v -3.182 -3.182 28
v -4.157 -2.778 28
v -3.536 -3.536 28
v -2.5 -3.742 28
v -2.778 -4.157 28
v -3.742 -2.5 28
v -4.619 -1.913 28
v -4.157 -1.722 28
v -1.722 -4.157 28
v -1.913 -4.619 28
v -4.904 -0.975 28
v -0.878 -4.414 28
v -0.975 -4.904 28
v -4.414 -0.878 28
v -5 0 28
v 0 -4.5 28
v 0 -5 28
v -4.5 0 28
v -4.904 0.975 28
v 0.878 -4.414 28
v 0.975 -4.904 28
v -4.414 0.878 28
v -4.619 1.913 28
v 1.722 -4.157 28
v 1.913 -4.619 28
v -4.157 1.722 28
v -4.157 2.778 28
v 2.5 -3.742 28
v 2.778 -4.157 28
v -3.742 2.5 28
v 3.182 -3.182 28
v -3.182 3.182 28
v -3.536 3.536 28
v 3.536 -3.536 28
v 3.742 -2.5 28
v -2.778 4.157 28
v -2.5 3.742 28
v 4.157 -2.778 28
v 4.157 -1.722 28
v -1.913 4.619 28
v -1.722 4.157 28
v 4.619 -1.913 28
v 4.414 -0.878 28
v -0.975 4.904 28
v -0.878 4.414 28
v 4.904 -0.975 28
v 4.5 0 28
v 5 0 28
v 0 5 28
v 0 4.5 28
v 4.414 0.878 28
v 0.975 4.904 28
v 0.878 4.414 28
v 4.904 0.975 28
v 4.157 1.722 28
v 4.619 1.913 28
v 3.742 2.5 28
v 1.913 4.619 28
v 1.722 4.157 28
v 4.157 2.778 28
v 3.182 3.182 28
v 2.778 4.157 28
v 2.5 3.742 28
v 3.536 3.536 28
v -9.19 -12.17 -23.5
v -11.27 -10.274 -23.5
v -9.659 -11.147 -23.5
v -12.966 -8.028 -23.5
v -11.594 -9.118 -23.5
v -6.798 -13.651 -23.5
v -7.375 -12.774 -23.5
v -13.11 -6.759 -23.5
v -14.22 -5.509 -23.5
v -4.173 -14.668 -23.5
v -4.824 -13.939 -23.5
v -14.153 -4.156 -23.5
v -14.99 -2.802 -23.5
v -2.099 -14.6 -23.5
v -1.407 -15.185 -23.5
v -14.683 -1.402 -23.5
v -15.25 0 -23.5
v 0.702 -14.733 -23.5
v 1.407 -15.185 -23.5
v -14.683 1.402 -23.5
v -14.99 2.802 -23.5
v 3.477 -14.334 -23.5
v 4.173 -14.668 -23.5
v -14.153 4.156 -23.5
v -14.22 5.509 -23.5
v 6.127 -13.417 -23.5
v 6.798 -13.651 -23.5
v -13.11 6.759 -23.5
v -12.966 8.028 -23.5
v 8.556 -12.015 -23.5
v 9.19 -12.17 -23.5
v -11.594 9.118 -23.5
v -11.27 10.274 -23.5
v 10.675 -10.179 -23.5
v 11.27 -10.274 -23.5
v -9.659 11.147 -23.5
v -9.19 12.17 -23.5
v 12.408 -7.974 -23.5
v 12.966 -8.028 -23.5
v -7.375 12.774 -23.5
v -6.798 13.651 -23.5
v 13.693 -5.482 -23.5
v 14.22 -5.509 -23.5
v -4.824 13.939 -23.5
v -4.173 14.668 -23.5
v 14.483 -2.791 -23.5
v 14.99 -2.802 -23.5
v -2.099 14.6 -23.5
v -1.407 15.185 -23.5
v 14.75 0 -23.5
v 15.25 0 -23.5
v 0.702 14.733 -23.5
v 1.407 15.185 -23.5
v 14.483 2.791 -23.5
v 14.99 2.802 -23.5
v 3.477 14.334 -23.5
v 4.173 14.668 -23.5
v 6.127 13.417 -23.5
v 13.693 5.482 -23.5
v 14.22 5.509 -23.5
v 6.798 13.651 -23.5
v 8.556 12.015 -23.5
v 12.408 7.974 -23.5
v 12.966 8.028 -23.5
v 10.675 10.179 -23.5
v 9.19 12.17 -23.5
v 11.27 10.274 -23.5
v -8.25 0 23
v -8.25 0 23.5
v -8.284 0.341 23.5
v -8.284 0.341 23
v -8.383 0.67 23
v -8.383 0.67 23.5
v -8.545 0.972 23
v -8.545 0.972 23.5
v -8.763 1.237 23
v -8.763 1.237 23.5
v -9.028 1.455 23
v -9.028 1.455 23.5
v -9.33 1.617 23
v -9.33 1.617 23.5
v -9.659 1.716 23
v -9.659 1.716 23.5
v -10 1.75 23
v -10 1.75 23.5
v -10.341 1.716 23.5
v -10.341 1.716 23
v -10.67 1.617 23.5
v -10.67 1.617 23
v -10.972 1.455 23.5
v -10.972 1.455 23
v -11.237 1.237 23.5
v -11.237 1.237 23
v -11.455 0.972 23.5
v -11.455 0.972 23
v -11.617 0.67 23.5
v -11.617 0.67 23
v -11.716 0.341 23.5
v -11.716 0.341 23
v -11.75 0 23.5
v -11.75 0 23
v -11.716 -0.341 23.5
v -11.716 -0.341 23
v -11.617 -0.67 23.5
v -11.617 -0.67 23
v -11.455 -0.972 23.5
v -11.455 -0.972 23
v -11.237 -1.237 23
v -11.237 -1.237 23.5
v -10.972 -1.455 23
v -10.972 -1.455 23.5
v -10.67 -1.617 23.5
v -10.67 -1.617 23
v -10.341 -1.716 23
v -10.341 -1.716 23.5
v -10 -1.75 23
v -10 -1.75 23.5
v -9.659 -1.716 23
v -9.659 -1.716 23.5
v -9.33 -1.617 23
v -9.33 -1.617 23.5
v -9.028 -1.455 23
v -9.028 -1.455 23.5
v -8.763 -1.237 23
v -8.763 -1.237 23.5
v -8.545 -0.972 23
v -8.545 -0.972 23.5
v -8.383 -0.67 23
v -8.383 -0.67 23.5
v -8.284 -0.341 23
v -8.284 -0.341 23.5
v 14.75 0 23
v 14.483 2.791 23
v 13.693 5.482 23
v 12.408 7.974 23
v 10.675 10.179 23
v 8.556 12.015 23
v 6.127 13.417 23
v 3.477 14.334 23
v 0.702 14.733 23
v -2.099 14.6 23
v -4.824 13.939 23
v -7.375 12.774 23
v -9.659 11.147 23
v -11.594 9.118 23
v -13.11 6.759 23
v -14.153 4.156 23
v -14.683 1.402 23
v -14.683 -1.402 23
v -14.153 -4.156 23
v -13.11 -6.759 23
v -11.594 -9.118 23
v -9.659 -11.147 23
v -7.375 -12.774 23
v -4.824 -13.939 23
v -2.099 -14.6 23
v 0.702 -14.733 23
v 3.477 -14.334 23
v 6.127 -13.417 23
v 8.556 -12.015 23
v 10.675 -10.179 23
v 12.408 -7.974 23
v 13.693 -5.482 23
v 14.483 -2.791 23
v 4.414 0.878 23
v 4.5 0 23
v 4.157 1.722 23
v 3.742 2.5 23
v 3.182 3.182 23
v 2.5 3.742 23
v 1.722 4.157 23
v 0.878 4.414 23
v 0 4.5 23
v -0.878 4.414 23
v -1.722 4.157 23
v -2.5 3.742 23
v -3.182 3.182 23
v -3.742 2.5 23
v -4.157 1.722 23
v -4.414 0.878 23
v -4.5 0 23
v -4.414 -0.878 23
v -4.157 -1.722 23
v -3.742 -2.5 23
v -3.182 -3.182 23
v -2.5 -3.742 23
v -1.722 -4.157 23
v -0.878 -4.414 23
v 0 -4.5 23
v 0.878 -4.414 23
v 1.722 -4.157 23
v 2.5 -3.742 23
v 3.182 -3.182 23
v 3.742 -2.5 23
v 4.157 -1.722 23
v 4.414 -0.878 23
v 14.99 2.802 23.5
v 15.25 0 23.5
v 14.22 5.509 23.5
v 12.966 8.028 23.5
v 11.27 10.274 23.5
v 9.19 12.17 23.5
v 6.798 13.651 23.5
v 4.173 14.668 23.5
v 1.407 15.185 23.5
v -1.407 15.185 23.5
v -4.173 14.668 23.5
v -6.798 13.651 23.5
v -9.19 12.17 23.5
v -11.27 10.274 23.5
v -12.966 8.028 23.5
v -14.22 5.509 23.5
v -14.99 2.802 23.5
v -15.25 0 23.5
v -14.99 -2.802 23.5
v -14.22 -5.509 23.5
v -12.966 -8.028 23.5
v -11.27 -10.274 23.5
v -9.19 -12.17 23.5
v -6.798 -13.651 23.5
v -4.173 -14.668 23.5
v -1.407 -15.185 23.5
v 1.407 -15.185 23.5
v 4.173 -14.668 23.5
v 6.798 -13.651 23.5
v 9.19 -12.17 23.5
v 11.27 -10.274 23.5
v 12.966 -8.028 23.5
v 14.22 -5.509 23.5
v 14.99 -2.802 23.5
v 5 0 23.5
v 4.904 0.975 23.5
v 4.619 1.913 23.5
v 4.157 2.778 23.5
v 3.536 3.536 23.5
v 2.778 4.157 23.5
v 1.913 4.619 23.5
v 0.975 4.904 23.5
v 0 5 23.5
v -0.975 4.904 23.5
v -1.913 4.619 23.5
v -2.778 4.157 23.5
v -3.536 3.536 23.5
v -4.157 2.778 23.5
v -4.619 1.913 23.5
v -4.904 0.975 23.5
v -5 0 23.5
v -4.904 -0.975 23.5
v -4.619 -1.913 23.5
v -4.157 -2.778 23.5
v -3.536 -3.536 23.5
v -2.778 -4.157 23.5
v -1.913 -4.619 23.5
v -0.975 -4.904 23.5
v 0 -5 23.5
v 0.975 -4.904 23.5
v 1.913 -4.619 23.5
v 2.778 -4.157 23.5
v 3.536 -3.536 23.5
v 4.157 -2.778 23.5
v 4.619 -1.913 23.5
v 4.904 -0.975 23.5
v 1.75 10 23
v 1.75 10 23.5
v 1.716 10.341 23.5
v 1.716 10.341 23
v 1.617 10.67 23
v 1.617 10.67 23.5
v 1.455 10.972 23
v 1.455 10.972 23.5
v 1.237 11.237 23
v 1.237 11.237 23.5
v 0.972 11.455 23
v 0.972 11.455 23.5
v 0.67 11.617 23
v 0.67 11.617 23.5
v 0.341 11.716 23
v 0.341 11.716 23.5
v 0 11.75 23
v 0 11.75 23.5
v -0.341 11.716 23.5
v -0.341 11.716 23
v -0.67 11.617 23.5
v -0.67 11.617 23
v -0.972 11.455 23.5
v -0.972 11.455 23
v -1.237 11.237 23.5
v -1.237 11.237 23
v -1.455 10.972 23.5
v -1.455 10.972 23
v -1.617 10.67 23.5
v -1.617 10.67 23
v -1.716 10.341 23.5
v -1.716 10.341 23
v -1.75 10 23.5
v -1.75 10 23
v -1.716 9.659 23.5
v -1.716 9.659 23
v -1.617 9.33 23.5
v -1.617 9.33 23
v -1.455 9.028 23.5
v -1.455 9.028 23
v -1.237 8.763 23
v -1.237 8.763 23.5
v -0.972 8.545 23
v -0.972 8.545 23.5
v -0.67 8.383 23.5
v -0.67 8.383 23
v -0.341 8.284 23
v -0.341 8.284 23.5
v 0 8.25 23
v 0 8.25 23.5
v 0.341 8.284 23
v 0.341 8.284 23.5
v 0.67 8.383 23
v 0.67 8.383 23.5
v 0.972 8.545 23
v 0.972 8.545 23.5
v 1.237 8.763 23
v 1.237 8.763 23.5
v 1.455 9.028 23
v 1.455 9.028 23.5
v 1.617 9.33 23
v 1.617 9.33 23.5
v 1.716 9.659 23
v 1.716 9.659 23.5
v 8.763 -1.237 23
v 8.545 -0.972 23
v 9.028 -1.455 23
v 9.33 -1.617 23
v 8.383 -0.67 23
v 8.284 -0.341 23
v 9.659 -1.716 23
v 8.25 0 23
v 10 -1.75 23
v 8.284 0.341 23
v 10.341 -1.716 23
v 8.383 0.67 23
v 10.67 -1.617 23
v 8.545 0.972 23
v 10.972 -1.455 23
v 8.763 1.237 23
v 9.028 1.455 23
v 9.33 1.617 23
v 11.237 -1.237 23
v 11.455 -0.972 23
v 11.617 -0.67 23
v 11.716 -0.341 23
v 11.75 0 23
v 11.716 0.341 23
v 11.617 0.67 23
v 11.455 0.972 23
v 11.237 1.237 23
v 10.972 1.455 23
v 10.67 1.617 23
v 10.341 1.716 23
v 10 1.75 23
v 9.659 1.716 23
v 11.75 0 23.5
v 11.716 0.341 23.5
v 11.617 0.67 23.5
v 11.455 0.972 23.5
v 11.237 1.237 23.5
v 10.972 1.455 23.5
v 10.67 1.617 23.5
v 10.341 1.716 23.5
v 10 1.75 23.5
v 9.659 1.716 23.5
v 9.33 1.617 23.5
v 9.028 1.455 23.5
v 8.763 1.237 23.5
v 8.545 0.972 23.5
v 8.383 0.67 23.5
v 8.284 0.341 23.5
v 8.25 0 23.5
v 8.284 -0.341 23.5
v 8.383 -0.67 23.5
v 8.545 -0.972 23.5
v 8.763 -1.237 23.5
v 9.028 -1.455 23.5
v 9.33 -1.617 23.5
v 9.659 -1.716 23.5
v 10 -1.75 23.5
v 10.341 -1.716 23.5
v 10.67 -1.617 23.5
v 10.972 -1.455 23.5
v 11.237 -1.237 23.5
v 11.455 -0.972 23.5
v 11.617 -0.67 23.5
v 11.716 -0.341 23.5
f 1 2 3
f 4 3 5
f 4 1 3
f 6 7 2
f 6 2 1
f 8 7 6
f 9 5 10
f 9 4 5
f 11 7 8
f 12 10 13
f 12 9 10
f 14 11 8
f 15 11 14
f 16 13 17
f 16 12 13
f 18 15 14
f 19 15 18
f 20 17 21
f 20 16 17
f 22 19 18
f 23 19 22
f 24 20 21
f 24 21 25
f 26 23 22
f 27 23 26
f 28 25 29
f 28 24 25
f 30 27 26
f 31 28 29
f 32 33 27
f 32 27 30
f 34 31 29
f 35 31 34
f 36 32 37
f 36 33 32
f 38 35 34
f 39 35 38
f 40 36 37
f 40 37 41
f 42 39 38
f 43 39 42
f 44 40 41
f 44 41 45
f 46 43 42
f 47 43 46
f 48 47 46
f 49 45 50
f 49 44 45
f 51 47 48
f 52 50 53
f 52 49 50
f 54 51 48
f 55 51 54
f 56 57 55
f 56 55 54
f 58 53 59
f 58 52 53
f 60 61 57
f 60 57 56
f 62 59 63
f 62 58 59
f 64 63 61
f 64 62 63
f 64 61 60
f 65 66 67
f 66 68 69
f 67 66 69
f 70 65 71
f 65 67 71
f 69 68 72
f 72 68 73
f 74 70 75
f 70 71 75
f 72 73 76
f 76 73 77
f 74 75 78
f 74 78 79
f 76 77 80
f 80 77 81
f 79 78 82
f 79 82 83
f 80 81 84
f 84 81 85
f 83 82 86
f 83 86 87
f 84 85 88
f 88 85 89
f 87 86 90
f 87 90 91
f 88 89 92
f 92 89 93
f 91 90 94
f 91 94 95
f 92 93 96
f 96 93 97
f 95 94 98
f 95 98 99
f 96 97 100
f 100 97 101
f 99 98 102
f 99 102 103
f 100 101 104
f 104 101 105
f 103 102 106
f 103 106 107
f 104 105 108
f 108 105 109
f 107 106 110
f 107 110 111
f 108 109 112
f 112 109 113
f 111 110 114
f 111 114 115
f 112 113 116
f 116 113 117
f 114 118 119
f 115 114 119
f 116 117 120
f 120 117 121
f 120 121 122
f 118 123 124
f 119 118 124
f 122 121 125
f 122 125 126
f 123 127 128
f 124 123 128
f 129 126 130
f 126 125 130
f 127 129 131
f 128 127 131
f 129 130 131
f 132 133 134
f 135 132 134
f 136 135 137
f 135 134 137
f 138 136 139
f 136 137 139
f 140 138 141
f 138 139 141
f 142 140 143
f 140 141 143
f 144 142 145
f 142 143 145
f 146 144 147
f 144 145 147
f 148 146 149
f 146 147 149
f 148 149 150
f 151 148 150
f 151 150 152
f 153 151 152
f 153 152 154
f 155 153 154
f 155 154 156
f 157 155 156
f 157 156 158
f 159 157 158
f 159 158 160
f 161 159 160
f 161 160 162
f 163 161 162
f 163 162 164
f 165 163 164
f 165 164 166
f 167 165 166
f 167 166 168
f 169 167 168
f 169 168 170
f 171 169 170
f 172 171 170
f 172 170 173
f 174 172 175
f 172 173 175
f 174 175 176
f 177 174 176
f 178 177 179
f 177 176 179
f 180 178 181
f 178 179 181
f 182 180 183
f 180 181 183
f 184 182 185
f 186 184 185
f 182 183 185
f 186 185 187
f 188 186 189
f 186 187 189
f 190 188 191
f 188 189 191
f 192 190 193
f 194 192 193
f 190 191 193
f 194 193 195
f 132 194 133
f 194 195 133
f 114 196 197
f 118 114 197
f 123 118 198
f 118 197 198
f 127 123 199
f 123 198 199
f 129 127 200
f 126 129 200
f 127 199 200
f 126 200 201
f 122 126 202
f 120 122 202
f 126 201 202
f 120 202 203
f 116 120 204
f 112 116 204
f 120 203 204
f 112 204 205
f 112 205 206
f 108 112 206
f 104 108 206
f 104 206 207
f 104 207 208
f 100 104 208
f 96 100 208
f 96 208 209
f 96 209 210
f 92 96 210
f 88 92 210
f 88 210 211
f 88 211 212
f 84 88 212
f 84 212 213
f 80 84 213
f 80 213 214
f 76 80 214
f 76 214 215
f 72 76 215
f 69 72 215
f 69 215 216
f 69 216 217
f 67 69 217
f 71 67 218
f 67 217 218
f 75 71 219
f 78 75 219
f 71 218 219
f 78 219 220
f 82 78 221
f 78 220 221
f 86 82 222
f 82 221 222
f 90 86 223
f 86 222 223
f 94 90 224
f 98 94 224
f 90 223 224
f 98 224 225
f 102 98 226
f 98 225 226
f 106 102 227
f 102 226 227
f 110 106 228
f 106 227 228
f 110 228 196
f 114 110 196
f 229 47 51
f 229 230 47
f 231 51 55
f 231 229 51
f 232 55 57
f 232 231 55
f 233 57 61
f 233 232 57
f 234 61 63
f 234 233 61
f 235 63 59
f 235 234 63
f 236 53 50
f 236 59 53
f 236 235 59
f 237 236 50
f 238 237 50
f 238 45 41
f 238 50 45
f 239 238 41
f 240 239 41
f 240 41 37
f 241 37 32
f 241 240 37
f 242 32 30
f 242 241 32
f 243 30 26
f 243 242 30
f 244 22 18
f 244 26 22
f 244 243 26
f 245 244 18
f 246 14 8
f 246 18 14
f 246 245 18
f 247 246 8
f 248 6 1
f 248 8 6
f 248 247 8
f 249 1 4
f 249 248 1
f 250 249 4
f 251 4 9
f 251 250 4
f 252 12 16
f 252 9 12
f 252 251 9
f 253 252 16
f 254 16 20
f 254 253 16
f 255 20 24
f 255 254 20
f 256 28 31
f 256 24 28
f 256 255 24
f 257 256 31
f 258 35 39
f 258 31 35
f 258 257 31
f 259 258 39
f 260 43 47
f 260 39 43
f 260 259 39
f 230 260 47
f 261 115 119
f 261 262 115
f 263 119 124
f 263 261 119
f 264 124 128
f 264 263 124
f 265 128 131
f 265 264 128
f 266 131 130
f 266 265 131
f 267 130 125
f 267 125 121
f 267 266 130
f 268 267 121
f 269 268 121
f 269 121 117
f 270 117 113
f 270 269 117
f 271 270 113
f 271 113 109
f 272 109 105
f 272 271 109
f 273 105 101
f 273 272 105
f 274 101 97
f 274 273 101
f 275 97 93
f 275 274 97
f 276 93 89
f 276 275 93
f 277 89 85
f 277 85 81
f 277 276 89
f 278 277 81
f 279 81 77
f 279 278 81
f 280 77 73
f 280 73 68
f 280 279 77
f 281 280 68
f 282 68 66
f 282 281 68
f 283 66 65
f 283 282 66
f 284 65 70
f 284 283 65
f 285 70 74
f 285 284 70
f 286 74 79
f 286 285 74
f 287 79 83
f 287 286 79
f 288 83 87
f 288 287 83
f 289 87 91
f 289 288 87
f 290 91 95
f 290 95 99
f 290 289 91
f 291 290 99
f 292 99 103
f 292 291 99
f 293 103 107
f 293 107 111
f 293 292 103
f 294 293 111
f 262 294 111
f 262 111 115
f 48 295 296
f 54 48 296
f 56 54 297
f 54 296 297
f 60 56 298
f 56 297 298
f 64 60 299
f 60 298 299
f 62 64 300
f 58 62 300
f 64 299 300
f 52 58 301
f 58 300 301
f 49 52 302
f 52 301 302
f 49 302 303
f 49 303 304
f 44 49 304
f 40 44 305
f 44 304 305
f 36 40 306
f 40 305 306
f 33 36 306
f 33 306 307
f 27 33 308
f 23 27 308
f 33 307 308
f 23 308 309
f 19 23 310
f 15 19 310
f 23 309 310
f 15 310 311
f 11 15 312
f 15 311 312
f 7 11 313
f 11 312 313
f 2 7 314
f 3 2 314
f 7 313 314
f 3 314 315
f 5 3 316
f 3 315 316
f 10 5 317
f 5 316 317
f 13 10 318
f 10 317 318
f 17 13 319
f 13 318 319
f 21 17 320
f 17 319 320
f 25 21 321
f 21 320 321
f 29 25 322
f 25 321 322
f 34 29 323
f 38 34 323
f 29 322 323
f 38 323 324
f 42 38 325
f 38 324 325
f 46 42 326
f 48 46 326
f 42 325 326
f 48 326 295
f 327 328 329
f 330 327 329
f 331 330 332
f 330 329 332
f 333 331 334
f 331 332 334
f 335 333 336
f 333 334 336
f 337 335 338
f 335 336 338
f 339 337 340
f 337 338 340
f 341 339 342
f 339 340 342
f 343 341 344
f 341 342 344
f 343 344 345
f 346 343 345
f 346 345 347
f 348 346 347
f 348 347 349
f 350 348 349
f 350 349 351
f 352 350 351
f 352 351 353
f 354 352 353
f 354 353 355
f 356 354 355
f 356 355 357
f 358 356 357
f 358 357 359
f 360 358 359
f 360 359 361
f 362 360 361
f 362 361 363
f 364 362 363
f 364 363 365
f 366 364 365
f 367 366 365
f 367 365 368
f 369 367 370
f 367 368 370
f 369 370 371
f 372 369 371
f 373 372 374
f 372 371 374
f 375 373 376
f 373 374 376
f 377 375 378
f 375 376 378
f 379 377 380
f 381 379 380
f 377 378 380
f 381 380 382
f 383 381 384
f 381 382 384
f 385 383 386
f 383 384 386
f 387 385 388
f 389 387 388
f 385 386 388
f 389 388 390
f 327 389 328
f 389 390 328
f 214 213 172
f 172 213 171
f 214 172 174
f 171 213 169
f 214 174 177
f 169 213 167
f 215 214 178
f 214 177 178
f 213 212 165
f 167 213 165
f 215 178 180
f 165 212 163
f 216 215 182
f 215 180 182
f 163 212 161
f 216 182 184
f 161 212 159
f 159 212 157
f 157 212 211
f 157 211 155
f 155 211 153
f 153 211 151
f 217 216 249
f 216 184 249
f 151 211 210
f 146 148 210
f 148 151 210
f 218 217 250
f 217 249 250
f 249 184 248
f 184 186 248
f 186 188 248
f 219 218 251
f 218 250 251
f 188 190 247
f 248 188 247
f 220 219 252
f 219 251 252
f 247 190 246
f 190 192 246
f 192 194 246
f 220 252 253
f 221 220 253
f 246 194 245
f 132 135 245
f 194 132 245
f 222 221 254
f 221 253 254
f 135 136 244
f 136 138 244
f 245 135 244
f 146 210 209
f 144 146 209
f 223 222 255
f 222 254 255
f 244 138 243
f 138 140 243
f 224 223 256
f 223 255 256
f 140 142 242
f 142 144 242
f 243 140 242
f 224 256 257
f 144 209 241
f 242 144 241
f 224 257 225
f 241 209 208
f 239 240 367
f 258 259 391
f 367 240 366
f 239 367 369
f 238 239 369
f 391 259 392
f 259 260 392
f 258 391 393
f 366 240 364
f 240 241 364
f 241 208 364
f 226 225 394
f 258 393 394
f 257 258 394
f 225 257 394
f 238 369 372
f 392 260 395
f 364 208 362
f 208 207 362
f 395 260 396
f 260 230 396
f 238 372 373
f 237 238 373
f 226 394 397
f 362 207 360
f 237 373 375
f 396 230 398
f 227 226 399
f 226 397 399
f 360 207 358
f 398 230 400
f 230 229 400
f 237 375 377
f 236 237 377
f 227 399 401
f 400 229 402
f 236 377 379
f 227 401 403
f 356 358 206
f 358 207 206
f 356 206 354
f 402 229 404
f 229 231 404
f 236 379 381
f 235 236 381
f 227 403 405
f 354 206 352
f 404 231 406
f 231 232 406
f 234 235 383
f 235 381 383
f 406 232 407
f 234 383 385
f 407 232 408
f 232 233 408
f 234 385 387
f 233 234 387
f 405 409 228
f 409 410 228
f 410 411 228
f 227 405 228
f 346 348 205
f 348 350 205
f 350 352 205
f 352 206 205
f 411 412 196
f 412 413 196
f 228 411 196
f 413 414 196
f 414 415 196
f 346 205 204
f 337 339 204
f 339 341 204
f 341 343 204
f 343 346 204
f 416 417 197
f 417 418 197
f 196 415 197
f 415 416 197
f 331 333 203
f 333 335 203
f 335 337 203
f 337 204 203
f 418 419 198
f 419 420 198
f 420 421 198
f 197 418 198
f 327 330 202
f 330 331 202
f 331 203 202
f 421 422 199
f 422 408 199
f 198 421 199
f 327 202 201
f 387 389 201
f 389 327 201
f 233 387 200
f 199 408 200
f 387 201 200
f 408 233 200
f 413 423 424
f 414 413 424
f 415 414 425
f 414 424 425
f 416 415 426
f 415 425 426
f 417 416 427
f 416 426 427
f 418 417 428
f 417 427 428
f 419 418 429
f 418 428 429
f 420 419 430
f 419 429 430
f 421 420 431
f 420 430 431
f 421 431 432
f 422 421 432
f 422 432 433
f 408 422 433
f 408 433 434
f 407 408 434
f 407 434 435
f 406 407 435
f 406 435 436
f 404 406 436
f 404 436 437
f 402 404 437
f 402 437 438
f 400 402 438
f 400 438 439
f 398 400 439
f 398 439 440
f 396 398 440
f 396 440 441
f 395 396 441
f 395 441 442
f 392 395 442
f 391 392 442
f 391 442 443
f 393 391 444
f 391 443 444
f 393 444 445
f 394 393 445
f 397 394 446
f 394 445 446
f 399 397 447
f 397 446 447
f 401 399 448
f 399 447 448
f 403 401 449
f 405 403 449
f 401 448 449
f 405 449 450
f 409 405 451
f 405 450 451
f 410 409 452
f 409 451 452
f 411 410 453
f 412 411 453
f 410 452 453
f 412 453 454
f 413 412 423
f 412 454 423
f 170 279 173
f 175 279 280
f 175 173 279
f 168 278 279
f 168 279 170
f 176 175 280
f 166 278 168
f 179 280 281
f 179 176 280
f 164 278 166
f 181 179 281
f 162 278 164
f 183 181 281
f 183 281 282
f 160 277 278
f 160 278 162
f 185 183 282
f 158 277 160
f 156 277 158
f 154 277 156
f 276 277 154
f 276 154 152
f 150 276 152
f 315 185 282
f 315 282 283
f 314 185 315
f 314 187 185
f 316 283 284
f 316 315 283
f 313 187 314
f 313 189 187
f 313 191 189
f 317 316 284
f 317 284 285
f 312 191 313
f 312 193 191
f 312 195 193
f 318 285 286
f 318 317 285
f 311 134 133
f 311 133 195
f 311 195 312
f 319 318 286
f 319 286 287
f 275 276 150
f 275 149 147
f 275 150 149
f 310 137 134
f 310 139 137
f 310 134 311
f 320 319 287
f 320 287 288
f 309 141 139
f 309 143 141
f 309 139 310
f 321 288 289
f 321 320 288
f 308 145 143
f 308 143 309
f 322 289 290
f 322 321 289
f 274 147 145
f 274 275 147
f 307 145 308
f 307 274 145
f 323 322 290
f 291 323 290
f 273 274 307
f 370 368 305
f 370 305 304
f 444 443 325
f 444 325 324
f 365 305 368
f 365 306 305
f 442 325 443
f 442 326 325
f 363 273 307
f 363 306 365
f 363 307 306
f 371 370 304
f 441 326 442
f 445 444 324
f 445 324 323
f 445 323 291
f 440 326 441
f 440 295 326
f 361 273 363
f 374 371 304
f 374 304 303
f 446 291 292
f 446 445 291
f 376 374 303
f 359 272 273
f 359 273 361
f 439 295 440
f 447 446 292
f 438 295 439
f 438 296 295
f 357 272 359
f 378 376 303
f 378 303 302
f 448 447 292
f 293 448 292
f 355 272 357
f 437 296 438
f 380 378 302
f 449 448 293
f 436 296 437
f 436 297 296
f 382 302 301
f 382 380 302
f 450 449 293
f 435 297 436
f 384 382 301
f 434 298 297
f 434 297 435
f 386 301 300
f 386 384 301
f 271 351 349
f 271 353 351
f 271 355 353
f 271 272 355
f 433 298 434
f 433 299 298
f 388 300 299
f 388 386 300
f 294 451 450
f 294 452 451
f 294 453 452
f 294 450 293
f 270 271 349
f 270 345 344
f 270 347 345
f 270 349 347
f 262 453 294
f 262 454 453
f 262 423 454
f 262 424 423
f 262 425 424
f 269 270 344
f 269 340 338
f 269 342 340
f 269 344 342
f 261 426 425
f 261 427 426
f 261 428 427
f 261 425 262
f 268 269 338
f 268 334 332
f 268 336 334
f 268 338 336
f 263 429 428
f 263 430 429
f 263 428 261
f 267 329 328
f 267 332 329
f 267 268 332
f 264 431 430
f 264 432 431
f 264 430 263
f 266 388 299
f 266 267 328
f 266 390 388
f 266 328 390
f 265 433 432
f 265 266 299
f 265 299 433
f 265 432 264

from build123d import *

# Parameters (mm, degrees)
SKETCH1_R           = 15.25
BOSS_EXTRUDE1_DEPTH = 23.5
SKETCH2_R           = 5
BOSS_EXTRUDE2_DEPTH = 4.5
SHELL1_T            = -0.5
SKETCH3_R           = 1.75
CUT_EXTRUDE1_DEPTH  = 4.5


with BuildPart() as part:
    # Sketch1 → Boss-Extrude1 (new, symmetric)
    with BuildSketch(Plane.XY):
        Circle(SKETCH1_R)
    extrude(amount=BOSS_EXTRUDE1_DEPTH, both=True)

    # Sketch2 → Boss-Extrude2 (add)
    with BuildSketch(Plane.XY.offset(23.5)):
        Circle(SKETCH2_R)
    extrude(amount=BOSS_EXTRUDE2_DEPTH)

    # Shell1
    shell1_openings = [part.faces().sort_by_distance(p)[0] for p in [
        (0, 0, -23.5),
        (0, 0, 28),
    ]]
    offset(amount=SHELL1_T, openings=shell1_openings, kind=Kind.INTERSECTION)

    # Sketch3 → Cut-Extrude1 (cut)
    with BuildSketch(Plane.XY.offset(23.5)):
        with Locations((-10, 0)):
            Circle(SKETCH3_R)
        with Locations((0, 10)):
            Circle(SKETCH3_R)
        with Locations((10, 0)):
            Circle(SKETCH3_R)
    extrude(amount=-CUT_EXTRUDE1_DEPTH, mode=Mode.SUBTRACT)


solid = part.part
